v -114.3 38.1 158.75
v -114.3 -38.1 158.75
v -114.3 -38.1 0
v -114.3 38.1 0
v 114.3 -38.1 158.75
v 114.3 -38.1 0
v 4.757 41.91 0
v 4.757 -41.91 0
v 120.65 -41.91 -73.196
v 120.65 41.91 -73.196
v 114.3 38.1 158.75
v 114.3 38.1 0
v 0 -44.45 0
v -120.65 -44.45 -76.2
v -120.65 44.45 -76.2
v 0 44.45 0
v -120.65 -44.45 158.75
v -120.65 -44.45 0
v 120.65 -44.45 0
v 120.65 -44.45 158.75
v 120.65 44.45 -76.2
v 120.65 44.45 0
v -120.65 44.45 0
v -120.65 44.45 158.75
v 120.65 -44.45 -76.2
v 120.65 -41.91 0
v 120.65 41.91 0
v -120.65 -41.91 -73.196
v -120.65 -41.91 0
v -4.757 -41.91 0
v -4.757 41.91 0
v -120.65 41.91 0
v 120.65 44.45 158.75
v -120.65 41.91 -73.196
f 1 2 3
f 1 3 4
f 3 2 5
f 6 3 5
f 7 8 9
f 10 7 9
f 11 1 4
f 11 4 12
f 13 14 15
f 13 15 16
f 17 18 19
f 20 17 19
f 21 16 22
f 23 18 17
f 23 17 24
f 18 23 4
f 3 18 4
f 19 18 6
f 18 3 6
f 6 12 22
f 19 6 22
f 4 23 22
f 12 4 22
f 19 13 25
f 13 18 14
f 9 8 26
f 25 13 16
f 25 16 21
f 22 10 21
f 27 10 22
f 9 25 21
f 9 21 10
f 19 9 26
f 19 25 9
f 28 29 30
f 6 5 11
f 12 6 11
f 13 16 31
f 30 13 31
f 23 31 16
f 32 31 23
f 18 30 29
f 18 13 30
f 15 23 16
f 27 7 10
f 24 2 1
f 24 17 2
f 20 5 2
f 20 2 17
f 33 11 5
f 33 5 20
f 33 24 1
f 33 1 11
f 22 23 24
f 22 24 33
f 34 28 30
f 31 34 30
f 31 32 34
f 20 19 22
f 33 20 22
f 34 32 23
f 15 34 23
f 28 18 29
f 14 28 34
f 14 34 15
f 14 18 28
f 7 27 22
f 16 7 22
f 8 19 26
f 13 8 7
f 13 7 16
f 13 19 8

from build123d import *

# Parameters (mm, degrees)
F0_W     = 241.3
F0_H     = 88.9
F1_DEPTH = 158.75
F2_T     = -6.35
F3_DEPTH = 25.4
F5_DEPTH = 88.9
F6_T     = -2.54
F6_2_T   = -2.54


with BuildPart() as f1:
    # F0 (on Top) → F1 (new body)
    with BuildSketch(Plane.XY):
        Rectangle(F0_W, F0_H)
    extrude(amount=F1_DEPTH)

    # F2
    f2_openings = [f1.faces().sort_by_distance(p)[0] for p in [
        (0, 0, 158.75),
    ]]
    offset(amount=F2_T, openings=f2_openings)

    # F3 (cut): a face of the model
    f3_faces = [f1.faces().sort_by_distance(p)[0] for p in [
        (0, 0, 6.35),
    ]]
    extrude(f3_faces, amount=-F3_DEPTH, mode=Mode.SUBTRACT)


with BuildPart() as f5:
    # F4 (on face) → F5 (new body)
    with BuildSketch(Plane.XZ.offset(44.45)):
        Polygon((0, 0), (-120.65, 0), (-120.65, -76.2), align=None)
    extrude(amount=-F5_DEPTH)

    # F6
    f6_openings = [f5.faces().sort_by_distance(p)[0] for p in [
        (-120.65, 0, -38.1),
        (-60.325, 0, 0),
    ]]
    offset(amount=F6_T, openings=f6_openings)


with BuildPart() as f5b:
    # F4 (on face) → F5, piece 2 (new body)
    with BuildSketch(Plane.XZ.offset(44.45)):
        Polygon((120.65, 0), (0, 0), (120.65, -76.2), align=None)
    extrude(amount=-F5_DEPTH)

    # F6#2
    f6_2_openings = [f5b.faces().sort_by_distance(p)[0] for p in [
        (60.325, 0, 0),
        (120.65, 0, -38.1),
    ]]
    offset(amount=F6_2_T, openings=f6_2_openings)


solid = Compound([f1.part, f5.part, f5b.part])
